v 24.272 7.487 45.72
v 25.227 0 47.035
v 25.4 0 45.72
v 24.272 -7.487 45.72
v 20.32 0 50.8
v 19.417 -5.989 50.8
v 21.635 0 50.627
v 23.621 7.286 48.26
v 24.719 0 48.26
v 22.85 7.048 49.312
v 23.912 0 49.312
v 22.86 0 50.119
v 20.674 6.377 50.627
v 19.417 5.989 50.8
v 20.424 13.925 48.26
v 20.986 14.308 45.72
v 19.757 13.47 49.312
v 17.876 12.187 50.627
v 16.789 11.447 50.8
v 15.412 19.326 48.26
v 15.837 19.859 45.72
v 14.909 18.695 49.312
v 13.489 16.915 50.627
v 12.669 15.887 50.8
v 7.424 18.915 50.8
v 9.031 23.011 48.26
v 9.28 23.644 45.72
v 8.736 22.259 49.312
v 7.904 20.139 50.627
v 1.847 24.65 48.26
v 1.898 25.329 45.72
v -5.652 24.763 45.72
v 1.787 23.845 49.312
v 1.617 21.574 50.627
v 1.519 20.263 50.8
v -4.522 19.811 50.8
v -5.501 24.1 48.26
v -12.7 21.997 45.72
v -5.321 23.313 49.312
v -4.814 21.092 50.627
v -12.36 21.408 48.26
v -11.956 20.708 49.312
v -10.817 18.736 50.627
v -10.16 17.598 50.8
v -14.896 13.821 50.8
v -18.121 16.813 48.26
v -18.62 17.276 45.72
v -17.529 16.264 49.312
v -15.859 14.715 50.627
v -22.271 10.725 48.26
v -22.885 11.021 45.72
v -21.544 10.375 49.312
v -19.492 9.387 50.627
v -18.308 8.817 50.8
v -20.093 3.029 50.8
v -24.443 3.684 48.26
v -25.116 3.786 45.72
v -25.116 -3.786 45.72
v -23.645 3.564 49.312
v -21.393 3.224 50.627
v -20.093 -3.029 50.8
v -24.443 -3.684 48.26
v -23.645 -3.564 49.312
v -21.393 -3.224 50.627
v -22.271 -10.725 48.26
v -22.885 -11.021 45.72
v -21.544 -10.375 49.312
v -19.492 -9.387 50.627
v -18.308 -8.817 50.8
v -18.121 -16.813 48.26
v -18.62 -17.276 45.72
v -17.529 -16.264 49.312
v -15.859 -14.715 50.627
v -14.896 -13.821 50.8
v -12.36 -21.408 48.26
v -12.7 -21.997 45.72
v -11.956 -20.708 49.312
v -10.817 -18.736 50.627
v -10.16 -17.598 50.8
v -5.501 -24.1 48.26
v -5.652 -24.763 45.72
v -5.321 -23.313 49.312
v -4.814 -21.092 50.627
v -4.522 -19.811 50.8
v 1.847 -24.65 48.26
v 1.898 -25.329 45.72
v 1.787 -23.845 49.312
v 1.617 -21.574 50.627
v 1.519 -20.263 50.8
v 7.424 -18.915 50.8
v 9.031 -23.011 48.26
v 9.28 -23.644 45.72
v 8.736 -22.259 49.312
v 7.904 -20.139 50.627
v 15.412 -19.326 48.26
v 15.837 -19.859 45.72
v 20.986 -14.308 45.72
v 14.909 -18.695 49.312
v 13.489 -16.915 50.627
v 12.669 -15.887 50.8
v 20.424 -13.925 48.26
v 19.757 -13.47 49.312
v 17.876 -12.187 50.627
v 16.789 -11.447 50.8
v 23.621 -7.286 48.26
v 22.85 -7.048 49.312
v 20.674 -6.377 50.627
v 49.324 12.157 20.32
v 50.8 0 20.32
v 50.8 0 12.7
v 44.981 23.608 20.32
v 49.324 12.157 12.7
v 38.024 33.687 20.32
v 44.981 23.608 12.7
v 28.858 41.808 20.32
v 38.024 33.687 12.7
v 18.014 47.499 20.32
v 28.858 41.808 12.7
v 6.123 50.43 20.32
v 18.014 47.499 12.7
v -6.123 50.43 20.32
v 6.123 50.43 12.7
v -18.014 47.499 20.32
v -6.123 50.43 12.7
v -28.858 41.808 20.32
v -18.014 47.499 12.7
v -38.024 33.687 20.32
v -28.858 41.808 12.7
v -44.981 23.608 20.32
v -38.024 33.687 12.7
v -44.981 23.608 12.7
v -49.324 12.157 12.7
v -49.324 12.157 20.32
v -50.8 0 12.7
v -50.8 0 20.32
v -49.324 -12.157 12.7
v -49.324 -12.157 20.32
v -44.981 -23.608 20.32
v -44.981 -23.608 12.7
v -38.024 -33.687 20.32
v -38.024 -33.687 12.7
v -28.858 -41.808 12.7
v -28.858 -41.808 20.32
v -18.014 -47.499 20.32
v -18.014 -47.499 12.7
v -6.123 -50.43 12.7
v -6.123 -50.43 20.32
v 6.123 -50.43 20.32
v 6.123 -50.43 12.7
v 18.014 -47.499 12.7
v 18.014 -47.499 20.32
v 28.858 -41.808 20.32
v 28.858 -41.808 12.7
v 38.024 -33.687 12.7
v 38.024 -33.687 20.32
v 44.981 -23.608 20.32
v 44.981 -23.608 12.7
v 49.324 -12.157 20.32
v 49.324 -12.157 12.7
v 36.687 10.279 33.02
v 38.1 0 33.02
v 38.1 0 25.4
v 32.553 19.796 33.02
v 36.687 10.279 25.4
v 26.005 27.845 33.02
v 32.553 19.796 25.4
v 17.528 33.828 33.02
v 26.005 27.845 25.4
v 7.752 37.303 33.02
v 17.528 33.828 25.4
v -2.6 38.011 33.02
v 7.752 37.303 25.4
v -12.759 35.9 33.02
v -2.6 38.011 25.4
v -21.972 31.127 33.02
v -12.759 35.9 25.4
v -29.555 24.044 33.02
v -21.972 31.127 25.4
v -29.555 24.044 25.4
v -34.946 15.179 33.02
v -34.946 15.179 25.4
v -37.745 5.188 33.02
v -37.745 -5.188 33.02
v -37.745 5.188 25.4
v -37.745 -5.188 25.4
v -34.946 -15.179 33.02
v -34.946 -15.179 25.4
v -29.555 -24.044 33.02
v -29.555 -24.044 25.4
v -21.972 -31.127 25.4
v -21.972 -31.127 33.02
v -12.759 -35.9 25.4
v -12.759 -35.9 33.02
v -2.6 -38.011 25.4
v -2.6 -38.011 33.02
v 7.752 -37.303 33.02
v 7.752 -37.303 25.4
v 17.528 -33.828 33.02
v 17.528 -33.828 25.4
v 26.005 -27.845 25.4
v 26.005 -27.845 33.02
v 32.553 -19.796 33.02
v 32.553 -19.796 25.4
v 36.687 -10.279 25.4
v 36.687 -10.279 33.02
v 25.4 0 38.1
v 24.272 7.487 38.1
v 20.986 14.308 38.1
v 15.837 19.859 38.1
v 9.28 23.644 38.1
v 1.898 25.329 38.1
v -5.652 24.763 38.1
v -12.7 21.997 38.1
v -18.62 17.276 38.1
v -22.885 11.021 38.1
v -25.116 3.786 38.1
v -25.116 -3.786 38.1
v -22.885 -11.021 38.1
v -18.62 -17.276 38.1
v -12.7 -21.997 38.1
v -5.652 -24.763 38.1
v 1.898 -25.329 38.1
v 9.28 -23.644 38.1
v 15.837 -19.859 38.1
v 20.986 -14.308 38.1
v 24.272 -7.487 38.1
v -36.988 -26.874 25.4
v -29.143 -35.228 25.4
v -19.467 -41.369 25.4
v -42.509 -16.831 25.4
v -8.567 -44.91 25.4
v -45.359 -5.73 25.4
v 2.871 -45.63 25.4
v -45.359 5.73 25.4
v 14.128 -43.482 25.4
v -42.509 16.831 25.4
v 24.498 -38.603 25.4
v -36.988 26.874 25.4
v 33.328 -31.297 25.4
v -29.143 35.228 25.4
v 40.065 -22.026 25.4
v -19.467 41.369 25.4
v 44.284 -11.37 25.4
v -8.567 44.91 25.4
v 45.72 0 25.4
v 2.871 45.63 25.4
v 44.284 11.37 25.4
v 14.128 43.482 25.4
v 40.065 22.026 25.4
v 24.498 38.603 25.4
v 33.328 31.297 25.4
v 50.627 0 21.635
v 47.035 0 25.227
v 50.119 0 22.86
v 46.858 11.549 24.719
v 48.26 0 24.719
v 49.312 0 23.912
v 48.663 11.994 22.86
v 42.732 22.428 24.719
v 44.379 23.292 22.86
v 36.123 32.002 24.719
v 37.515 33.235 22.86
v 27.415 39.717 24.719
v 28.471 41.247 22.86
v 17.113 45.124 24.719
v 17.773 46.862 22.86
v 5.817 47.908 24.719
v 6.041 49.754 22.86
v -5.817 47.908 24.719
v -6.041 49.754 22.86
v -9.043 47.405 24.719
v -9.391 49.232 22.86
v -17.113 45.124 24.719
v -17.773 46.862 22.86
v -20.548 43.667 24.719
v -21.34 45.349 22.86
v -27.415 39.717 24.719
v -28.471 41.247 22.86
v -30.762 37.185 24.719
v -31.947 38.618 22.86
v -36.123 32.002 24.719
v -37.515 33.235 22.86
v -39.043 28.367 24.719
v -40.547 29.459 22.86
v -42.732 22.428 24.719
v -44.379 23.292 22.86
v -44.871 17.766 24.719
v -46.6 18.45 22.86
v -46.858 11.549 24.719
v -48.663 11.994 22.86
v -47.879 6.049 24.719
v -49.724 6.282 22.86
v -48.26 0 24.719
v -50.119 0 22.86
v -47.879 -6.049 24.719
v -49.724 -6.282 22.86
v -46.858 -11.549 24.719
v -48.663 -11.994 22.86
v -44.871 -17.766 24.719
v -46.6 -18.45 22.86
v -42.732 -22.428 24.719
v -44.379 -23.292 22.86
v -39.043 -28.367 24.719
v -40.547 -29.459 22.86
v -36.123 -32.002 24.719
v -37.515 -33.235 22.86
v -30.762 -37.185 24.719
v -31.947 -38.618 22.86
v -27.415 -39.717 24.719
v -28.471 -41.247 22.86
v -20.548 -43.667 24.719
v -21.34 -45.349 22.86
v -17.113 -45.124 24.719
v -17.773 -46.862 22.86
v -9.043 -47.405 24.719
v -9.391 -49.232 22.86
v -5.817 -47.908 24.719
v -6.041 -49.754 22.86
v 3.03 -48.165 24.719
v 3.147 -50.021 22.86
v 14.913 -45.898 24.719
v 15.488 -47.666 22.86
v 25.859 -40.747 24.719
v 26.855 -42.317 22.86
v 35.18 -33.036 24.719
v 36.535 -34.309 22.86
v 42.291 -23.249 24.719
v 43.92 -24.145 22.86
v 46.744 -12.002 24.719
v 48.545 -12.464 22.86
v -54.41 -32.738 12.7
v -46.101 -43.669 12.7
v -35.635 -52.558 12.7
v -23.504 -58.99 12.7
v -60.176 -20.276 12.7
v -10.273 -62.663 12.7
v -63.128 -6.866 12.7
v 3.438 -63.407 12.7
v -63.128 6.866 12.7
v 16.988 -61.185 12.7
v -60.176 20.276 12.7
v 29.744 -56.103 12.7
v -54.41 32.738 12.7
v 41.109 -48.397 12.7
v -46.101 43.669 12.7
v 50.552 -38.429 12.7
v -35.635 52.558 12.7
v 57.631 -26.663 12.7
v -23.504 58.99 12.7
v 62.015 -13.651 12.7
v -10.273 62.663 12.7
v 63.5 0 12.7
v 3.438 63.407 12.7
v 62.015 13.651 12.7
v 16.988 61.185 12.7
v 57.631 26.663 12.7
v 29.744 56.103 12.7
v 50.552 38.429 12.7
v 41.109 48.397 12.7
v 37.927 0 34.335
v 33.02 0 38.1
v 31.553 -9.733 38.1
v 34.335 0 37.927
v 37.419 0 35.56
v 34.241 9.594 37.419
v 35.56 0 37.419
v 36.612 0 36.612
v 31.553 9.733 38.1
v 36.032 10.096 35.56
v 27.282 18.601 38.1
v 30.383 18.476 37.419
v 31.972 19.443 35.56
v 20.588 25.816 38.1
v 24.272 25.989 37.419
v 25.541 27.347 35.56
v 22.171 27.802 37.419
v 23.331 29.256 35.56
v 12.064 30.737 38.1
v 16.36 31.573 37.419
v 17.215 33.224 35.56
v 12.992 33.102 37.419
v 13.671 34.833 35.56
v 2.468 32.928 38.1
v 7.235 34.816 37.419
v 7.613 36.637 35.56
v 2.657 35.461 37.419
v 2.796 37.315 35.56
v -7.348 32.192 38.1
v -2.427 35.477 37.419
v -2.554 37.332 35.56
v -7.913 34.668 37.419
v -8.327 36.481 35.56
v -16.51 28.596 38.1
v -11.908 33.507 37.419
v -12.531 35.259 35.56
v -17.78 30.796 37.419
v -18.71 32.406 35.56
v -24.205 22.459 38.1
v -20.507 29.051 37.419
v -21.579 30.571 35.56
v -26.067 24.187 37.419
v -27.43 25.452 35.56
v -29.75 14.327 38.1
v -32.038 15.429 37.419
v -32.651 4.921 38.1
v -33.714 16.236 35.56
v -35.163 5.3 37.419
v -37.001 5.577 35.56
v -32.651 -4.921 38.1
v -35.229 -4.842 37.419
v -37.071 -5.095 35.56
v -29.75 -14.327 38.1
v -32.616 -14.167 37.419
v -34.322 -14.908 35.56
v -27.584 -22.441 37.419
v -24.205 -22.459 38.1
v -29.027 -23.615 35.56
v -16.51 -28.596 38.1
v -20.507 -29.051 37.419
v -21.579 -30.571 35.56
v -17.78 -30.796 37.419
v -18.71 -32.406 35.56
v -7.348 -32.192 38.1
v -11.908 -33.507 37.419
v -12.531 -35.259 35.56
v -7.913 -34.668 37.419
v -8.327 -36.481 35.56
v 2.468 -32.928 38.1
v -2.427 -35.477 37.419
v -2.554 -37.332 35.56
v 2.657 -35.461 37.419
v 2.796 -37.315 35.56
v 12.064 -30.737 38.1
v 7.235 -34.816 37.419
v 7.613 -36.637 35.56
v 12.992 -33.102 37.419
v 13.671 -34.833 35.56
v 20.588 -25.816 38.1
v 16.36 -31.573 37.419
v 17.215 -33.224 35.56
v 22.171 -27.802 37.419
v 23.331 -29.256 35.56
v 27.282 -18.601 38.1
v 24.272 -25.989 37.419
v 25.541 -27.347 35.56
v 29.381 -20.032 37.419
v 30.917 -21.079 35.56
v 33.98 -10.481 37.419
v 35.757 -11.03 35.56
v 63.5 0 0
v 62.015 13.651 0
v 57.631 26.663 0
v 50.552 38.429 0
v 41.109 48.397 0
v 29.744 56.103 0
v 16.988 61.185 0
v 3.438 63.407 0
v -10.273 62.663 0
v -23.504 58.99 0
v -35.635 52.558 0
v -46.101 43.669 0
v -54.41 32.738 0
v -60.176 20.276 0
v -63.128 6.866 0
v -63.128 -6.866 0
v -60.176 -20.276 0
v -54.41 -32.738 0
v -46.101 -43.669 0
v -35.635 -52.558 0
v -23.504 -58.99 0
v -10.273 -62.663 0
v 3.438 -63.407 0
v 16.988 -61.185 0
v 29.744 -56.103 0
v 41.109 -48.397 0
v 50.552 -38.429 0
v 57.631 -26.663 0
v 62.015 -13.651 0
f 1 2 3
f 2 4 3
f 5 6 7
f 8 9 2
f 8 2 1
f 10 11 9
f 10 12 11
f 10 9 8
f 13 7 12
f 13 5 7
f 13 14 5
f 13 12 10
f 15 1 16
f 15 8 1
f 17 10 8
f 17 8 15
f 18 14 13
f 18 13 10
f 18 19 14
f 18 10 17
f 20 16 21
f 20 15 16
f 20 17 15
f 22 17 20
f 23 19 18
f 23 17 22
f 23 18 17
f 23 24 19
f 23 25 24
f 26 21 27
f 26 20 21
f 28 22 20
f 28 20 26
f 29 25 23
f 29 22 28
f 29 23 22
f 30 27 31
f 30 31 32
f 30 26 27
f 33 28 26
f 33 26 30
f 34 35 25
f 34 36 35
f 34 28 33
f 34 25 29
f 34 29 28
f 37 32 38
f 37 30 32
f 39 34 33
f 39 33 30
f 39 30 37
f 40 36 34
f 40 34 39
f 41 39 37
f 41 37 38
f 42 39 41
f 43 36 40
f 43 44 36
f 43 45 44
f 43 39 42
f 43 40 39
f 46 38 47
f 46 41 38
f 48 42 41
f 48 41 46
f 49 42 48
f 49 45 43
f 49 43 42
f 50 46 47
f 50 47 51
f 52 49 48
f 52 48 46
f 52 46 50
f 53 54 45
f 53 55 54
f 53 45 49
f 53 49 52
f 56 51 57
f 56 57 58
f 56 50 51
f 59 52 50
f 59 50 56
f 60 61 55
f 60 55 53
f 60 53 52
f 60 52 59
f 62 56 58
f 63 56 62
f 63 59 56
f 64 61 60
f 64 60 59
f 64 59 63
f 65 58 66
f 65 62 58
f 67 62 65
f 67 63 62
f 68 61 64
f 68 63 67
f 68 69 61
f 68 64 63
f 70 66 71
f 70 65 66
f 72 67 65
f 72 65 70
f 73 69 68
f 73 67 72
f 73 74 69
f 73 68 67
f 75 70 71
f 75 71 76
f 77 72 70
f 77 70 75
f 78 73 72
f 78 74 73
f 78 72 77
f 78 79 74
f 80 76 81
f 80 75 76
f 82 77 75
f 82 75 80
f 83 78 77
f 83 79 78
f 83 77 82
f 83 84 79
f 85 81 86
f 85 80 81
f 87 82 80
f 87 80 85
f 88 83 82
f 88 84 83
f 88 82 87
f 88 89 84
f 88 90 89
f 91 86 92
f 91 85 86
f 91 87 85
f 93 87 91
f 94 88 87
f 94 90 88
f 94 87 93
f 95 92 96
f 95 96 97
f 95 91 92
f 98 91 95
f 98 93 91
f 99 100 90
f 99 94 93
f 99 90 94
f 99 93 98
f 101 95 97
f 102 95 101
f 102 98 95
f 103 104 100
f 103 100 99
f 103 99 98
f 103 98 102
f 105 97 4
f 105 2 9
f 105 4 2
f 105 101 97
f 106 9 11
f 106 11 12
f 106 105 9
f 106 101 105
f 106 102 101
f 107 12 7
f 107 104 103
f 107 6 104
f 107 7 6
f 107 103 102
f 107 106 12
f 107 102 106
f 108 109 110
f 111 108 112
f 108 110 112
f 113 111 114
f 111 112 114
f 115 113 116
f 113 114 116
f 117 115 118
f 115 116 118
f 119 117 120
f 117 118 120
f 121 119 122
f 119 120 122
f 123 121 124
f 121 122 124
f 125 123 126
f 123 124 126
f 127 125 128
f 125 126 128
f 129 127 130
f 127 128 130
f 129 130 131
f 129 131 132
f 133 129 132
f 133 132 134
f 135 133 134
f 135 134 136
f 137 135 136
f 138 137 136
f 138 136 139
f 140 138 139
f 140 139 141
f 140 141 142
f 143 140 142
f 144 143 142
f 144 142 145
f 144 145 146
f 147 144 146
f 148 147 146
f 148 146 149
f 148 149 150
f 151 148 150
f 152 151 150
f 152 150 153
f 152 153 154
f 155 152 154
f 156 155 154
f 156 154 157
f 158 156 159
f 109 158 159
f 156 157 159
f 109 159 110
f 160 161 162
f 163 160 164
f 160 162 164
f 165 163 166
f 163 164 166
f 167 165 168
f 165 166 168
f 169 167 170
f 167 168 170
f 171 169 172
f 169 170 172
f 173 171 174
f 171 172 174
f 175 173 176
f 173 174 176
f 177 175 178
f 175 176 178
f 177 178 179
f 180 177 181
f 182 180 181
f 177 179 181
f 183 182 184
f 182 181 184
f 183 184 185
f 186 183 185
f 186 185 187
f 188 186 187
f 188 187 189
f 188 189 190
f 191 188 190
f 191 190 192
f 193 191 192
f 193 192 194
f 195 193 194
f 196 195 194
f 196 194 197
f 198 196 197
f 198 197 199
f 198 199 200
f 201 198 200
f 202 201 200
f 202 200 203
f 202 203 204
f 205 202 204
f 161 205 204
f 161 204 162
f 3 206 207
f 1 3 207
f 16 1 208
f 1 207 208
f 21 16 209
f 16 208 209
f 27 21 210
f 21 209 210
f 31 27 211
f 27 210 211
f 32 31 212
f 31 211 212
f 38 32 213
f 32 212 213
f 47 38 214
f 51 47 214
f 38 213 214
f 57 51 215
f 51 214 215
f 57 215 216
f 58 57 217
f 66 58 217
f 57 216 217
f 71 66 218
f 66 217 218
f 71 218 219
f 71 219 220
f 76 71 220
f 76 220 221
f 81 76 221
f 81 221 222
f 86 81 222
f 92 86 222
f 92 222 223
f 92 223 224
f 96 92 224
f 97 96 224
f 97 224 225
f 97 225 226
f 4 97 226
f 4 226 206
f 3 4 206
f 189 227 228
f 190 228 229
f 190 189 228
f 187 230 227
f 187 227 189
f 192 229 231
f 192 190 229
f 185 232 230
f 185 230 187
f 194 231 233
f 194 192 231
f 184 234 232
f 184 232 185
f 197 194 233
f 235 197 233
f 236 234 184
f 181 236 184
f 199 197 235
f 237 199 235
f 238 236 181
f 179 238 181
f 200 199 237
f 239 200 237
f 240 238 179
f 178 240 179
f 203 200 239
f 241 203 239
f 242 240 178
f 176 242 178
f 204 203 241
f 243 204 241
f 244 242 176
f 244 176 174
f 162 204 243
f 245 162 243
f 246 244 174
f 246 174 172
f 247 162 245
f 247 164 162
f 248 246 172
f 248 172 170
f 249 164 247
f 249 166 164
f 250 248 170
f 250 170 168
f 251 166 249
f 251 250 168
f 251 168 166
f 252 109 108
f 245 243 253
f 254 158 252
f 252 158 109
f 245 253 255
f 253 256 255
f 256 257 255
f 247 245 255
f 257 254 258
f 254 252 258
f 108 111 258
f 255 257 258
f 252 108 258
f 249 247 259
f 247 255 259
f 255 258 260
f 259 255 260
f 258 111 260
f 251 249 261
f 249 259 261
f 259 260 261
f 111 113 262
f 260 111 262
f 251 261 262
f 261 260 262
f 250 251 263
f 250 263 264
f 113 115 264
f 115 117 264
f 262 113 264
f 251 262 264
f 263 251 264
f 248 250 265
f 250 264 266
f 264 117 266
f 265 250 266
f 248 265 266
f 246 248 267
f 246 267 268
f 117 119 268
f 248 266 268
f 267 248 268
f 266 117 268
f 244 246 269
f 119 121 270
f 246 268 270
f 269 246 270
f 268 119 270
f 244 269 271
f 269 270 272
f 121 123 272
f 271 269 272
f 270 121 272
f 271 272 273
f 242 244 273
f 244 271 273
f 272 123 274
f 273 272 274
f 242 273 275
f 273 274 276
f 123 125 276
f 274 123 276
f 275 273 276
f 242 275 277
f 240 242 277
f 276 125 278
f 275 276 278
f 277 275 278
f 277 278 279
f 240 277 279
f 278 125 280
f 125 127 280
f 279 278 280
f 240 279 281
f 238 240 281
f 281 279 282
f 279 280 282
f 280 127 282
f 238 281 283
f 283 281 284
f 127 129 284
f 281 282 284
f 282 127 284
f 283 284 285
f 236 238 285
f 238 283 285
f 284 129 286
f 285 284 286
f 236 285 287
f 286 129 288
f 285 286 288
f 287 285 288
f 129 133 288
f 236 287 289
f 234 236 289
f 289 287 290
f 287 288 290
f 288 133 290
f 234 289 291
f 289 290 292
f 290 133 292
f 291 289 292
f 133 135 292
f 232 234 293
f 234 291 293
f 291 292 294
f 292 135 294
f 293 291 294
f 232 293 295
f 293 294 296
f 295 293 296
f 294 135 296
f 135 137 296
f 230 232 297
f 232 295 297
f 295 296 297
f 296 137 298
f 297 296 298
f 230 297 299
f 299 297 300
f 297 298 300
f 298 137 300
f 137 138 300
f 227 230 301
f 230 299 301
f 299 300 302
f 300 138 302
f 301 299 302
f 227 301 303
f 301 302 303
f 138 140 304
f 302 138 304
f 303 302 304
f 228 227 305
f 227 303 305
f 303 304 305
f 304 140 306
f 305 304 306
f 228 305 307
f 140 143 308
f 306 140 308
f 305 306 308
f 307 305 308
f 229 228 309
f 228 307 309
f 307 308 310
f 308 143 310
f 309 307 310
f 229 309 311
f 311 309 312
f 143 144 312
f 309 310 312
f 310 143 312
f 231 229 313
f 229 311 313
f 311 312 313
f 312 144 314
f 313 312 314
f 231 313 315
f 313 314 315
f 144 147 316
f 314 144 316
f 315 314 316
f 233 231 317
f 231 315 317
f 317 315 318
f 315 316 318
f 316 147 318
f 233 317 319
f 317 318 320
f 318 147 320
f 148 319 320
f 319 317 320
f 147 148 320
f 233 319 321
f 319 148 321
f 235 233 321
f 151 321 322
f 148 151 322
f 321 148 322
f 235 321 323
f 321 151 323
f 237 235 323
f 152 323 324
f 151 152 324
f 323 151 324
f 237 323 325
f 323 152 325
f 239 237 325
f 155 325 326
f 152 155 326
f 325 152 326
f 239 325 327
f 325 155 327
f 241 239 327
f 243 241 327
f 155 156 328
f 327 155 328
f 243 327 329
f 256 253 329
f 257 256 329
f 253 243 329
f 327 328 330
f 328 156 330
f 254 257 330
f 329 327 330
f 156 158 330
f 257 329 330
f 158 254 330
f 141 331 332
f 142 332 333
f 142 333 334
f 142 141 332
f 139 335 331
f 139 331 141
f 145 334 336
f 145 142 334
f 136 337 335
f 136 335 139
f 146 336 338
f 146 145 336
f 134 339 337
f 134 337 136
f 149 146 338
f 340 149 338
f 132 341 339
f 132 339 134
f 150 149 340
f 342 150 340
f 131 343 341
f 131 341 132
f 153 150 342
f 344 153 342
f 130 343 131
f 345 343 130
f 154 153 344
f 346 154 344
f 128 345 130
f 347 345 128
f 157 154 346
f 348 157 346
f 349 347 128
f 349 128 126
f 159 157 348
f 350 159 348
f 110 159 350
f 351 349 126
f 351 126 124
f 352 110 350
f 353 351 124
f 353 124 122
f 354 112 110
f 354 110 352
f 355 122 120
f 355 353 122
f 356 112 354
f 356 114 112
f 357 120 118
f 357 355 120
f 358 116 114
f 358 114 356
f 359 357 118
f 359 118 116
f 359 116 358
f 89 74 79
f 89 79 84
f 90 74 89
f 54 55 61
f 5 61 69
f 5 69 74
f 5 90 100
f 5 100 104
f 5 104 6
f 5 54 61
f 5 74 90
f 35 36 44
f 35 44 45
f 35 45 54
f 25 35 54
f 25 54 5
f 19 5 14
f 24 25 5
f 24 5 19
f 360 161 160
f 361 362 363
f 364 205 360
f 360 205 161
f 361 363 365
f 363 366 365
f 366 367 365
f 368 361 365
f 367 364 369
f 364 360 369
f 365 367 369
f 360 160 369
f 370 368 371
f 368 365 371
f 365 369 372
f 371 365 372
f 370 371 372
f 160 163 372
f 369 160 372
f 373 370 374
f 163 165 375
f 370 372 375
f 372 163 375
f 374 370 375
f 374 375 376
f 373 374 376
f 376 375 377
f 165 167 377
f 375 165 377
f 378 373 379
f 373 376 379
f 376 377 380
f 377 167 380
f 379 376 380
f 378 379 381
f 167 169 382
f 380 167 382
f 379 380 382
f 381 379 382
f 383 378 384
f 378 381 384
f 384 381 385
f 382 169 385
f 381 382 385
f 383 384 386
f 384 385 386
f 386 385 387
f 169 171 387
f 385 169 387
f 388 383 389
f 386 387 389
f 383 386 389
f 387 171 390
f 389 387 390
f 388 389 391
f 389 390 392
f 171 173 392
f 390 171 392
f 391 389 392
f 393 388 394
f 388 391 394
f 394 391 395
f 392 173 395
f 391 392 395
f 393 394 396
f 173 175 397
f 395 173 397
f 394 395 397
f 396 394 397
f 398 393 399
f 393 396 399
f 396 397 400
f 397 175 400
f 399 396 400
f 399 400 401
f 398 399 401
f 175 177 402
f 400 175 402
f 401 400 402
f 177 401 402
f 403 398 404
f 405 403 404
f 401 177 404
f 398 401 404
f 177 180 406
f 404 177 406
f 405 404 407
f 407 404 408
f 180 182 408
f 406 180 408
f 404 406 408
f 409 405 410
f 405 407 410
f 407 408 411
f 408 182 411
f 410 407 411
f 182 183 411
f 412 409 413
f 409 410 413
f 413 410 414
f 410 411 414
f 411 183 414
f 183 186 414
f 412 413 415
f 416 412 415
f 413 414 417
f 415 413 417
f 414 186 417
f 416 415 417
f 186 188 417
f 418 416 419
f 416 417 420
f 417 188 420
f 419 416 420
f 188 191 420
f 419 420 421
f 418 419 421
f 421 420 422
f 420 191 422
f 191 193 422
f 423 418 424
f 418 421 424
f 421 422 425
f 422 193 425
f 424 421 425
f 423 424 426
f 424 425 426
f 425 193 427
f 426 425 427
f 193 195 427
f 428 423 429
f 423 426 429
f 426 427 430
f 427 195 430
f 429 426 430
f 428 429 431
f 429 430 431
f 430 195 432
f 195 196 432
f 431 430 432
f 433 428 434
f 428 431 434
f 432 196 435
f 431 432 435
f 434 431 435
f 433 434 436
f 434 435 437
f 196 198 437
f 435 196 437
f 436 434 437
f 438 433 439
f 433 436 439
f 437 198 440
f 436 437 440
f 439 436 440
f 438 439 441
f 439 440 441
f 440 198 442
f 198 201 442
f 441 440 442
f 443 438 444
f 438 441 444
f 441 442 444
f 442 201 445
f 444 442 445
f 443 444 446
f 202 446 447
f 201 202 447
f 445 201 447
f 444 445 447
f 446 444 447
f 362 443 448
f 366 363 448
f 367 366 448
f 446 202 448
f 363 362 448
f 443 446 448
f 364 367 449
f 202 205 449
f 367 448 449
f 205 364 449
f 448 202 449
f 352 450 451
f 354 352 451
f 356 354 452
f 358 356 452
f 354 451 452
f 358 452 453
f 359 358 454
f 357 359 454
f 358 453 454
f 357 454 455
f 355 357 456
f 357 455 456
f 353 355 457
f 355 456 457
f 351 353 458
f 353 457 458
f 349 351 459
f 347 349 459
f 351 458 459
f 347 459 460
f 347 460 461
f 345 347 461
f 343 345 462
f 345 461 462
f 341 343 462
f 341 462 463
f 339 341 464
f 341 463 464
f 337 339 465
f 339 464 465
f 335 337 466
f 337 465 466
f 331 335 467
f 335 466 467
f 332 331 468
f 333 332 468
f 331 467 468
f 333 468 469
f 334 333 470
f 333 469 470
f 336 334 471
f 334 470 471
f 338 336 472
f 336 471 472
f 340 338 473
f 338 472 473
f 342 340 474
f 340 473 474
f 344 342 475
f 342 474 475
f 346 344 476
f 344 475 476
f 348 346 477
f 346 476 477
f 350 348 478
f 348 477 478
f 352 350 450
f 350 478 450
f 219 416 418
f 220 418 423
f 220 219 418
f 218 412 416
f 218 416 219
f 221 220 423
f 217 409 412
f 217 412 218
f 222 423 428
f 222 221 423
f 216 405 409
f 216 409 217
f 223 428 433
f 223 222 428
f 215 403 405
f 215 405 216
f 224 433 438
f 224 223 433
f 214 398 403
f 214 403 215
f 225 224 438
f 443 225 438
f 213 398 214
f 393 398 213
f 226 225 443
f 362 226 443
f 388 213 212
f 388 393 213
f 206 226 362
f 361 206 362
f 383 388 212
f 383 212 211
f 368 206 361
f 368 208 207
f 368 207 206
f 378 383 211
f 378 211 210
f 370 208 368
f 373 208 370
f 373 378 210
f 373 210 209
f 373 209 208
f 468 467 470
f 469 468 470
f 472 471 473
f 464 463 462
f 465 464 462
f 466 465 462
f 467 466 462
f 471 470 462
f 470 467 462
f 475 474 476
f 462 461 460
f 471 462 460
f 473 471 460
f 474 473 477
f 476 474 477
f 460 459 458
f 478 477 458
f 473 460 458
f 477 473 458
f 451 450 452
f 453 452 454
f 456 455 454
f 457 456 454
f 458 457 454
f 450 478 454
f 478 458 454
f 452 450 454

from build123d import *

# Parameters (mm, degrees)
F0_R     = 63.5
F1_DEPTH = 12.7
F4_R     = 50.8
F5_DEPTH = 25.4
F6_R     = 38.1
F7_DEPTH = 38.1
F8_R     = 25.4
F9_DEPTH = 50.8
F10_R    = 5.08
F11_R    = 5.08
F12_R    = 5.08


# Not quite as in the source:
# - the program builds the solid bodies; features that only make, move or delete a surface that nothing else refers to are left out


with BuildPart() as f1:
    # F0 (on Top) → F1 (new body)
    with BuildSketch(Plane.XY):
        Circle(F0_R)
    extrude(amount=F1_DEPTH)

    # F4 (on Top) → F5 (join)
    with BuildSketch(Plane.XY):
        Circle(F4_R)
    extrude(amount=F5_DEPTH)

    # F6 (on Top) → F7 (join)
    with BuildSketch(Plane.XY):
        Circle(F6_R)
    extrude(amount=F7_DEPTH)

    # F8 (on Top) → F9 (join)
    with BuildSketch(Plane.XY):
        Circle(F8_R)
    extrude(amount=F9_DEPTH)

    # F10
    f10_edges = [f1.edges().sort_by_distance(p)[0] for p in [
        (-25.4, 0, 50.8),
    ]]
    fillet(f10_edges, radius=F10_R)

    # F11
    f11_edges = [f1.edges().sort_by_distance(p)[0] for p in [
        (-38.1, 0, 38.1),
    ]]
    fillet(f11_edges, radius=F11_R)

    # F12
    f12_edges = [f1.edges().sort_by_distance(p)[0] for p in [
        (-50.8, 0, 25.4),
    ]]
    fillet(f12_edges, radius=F12_R)


solid = f1.part
